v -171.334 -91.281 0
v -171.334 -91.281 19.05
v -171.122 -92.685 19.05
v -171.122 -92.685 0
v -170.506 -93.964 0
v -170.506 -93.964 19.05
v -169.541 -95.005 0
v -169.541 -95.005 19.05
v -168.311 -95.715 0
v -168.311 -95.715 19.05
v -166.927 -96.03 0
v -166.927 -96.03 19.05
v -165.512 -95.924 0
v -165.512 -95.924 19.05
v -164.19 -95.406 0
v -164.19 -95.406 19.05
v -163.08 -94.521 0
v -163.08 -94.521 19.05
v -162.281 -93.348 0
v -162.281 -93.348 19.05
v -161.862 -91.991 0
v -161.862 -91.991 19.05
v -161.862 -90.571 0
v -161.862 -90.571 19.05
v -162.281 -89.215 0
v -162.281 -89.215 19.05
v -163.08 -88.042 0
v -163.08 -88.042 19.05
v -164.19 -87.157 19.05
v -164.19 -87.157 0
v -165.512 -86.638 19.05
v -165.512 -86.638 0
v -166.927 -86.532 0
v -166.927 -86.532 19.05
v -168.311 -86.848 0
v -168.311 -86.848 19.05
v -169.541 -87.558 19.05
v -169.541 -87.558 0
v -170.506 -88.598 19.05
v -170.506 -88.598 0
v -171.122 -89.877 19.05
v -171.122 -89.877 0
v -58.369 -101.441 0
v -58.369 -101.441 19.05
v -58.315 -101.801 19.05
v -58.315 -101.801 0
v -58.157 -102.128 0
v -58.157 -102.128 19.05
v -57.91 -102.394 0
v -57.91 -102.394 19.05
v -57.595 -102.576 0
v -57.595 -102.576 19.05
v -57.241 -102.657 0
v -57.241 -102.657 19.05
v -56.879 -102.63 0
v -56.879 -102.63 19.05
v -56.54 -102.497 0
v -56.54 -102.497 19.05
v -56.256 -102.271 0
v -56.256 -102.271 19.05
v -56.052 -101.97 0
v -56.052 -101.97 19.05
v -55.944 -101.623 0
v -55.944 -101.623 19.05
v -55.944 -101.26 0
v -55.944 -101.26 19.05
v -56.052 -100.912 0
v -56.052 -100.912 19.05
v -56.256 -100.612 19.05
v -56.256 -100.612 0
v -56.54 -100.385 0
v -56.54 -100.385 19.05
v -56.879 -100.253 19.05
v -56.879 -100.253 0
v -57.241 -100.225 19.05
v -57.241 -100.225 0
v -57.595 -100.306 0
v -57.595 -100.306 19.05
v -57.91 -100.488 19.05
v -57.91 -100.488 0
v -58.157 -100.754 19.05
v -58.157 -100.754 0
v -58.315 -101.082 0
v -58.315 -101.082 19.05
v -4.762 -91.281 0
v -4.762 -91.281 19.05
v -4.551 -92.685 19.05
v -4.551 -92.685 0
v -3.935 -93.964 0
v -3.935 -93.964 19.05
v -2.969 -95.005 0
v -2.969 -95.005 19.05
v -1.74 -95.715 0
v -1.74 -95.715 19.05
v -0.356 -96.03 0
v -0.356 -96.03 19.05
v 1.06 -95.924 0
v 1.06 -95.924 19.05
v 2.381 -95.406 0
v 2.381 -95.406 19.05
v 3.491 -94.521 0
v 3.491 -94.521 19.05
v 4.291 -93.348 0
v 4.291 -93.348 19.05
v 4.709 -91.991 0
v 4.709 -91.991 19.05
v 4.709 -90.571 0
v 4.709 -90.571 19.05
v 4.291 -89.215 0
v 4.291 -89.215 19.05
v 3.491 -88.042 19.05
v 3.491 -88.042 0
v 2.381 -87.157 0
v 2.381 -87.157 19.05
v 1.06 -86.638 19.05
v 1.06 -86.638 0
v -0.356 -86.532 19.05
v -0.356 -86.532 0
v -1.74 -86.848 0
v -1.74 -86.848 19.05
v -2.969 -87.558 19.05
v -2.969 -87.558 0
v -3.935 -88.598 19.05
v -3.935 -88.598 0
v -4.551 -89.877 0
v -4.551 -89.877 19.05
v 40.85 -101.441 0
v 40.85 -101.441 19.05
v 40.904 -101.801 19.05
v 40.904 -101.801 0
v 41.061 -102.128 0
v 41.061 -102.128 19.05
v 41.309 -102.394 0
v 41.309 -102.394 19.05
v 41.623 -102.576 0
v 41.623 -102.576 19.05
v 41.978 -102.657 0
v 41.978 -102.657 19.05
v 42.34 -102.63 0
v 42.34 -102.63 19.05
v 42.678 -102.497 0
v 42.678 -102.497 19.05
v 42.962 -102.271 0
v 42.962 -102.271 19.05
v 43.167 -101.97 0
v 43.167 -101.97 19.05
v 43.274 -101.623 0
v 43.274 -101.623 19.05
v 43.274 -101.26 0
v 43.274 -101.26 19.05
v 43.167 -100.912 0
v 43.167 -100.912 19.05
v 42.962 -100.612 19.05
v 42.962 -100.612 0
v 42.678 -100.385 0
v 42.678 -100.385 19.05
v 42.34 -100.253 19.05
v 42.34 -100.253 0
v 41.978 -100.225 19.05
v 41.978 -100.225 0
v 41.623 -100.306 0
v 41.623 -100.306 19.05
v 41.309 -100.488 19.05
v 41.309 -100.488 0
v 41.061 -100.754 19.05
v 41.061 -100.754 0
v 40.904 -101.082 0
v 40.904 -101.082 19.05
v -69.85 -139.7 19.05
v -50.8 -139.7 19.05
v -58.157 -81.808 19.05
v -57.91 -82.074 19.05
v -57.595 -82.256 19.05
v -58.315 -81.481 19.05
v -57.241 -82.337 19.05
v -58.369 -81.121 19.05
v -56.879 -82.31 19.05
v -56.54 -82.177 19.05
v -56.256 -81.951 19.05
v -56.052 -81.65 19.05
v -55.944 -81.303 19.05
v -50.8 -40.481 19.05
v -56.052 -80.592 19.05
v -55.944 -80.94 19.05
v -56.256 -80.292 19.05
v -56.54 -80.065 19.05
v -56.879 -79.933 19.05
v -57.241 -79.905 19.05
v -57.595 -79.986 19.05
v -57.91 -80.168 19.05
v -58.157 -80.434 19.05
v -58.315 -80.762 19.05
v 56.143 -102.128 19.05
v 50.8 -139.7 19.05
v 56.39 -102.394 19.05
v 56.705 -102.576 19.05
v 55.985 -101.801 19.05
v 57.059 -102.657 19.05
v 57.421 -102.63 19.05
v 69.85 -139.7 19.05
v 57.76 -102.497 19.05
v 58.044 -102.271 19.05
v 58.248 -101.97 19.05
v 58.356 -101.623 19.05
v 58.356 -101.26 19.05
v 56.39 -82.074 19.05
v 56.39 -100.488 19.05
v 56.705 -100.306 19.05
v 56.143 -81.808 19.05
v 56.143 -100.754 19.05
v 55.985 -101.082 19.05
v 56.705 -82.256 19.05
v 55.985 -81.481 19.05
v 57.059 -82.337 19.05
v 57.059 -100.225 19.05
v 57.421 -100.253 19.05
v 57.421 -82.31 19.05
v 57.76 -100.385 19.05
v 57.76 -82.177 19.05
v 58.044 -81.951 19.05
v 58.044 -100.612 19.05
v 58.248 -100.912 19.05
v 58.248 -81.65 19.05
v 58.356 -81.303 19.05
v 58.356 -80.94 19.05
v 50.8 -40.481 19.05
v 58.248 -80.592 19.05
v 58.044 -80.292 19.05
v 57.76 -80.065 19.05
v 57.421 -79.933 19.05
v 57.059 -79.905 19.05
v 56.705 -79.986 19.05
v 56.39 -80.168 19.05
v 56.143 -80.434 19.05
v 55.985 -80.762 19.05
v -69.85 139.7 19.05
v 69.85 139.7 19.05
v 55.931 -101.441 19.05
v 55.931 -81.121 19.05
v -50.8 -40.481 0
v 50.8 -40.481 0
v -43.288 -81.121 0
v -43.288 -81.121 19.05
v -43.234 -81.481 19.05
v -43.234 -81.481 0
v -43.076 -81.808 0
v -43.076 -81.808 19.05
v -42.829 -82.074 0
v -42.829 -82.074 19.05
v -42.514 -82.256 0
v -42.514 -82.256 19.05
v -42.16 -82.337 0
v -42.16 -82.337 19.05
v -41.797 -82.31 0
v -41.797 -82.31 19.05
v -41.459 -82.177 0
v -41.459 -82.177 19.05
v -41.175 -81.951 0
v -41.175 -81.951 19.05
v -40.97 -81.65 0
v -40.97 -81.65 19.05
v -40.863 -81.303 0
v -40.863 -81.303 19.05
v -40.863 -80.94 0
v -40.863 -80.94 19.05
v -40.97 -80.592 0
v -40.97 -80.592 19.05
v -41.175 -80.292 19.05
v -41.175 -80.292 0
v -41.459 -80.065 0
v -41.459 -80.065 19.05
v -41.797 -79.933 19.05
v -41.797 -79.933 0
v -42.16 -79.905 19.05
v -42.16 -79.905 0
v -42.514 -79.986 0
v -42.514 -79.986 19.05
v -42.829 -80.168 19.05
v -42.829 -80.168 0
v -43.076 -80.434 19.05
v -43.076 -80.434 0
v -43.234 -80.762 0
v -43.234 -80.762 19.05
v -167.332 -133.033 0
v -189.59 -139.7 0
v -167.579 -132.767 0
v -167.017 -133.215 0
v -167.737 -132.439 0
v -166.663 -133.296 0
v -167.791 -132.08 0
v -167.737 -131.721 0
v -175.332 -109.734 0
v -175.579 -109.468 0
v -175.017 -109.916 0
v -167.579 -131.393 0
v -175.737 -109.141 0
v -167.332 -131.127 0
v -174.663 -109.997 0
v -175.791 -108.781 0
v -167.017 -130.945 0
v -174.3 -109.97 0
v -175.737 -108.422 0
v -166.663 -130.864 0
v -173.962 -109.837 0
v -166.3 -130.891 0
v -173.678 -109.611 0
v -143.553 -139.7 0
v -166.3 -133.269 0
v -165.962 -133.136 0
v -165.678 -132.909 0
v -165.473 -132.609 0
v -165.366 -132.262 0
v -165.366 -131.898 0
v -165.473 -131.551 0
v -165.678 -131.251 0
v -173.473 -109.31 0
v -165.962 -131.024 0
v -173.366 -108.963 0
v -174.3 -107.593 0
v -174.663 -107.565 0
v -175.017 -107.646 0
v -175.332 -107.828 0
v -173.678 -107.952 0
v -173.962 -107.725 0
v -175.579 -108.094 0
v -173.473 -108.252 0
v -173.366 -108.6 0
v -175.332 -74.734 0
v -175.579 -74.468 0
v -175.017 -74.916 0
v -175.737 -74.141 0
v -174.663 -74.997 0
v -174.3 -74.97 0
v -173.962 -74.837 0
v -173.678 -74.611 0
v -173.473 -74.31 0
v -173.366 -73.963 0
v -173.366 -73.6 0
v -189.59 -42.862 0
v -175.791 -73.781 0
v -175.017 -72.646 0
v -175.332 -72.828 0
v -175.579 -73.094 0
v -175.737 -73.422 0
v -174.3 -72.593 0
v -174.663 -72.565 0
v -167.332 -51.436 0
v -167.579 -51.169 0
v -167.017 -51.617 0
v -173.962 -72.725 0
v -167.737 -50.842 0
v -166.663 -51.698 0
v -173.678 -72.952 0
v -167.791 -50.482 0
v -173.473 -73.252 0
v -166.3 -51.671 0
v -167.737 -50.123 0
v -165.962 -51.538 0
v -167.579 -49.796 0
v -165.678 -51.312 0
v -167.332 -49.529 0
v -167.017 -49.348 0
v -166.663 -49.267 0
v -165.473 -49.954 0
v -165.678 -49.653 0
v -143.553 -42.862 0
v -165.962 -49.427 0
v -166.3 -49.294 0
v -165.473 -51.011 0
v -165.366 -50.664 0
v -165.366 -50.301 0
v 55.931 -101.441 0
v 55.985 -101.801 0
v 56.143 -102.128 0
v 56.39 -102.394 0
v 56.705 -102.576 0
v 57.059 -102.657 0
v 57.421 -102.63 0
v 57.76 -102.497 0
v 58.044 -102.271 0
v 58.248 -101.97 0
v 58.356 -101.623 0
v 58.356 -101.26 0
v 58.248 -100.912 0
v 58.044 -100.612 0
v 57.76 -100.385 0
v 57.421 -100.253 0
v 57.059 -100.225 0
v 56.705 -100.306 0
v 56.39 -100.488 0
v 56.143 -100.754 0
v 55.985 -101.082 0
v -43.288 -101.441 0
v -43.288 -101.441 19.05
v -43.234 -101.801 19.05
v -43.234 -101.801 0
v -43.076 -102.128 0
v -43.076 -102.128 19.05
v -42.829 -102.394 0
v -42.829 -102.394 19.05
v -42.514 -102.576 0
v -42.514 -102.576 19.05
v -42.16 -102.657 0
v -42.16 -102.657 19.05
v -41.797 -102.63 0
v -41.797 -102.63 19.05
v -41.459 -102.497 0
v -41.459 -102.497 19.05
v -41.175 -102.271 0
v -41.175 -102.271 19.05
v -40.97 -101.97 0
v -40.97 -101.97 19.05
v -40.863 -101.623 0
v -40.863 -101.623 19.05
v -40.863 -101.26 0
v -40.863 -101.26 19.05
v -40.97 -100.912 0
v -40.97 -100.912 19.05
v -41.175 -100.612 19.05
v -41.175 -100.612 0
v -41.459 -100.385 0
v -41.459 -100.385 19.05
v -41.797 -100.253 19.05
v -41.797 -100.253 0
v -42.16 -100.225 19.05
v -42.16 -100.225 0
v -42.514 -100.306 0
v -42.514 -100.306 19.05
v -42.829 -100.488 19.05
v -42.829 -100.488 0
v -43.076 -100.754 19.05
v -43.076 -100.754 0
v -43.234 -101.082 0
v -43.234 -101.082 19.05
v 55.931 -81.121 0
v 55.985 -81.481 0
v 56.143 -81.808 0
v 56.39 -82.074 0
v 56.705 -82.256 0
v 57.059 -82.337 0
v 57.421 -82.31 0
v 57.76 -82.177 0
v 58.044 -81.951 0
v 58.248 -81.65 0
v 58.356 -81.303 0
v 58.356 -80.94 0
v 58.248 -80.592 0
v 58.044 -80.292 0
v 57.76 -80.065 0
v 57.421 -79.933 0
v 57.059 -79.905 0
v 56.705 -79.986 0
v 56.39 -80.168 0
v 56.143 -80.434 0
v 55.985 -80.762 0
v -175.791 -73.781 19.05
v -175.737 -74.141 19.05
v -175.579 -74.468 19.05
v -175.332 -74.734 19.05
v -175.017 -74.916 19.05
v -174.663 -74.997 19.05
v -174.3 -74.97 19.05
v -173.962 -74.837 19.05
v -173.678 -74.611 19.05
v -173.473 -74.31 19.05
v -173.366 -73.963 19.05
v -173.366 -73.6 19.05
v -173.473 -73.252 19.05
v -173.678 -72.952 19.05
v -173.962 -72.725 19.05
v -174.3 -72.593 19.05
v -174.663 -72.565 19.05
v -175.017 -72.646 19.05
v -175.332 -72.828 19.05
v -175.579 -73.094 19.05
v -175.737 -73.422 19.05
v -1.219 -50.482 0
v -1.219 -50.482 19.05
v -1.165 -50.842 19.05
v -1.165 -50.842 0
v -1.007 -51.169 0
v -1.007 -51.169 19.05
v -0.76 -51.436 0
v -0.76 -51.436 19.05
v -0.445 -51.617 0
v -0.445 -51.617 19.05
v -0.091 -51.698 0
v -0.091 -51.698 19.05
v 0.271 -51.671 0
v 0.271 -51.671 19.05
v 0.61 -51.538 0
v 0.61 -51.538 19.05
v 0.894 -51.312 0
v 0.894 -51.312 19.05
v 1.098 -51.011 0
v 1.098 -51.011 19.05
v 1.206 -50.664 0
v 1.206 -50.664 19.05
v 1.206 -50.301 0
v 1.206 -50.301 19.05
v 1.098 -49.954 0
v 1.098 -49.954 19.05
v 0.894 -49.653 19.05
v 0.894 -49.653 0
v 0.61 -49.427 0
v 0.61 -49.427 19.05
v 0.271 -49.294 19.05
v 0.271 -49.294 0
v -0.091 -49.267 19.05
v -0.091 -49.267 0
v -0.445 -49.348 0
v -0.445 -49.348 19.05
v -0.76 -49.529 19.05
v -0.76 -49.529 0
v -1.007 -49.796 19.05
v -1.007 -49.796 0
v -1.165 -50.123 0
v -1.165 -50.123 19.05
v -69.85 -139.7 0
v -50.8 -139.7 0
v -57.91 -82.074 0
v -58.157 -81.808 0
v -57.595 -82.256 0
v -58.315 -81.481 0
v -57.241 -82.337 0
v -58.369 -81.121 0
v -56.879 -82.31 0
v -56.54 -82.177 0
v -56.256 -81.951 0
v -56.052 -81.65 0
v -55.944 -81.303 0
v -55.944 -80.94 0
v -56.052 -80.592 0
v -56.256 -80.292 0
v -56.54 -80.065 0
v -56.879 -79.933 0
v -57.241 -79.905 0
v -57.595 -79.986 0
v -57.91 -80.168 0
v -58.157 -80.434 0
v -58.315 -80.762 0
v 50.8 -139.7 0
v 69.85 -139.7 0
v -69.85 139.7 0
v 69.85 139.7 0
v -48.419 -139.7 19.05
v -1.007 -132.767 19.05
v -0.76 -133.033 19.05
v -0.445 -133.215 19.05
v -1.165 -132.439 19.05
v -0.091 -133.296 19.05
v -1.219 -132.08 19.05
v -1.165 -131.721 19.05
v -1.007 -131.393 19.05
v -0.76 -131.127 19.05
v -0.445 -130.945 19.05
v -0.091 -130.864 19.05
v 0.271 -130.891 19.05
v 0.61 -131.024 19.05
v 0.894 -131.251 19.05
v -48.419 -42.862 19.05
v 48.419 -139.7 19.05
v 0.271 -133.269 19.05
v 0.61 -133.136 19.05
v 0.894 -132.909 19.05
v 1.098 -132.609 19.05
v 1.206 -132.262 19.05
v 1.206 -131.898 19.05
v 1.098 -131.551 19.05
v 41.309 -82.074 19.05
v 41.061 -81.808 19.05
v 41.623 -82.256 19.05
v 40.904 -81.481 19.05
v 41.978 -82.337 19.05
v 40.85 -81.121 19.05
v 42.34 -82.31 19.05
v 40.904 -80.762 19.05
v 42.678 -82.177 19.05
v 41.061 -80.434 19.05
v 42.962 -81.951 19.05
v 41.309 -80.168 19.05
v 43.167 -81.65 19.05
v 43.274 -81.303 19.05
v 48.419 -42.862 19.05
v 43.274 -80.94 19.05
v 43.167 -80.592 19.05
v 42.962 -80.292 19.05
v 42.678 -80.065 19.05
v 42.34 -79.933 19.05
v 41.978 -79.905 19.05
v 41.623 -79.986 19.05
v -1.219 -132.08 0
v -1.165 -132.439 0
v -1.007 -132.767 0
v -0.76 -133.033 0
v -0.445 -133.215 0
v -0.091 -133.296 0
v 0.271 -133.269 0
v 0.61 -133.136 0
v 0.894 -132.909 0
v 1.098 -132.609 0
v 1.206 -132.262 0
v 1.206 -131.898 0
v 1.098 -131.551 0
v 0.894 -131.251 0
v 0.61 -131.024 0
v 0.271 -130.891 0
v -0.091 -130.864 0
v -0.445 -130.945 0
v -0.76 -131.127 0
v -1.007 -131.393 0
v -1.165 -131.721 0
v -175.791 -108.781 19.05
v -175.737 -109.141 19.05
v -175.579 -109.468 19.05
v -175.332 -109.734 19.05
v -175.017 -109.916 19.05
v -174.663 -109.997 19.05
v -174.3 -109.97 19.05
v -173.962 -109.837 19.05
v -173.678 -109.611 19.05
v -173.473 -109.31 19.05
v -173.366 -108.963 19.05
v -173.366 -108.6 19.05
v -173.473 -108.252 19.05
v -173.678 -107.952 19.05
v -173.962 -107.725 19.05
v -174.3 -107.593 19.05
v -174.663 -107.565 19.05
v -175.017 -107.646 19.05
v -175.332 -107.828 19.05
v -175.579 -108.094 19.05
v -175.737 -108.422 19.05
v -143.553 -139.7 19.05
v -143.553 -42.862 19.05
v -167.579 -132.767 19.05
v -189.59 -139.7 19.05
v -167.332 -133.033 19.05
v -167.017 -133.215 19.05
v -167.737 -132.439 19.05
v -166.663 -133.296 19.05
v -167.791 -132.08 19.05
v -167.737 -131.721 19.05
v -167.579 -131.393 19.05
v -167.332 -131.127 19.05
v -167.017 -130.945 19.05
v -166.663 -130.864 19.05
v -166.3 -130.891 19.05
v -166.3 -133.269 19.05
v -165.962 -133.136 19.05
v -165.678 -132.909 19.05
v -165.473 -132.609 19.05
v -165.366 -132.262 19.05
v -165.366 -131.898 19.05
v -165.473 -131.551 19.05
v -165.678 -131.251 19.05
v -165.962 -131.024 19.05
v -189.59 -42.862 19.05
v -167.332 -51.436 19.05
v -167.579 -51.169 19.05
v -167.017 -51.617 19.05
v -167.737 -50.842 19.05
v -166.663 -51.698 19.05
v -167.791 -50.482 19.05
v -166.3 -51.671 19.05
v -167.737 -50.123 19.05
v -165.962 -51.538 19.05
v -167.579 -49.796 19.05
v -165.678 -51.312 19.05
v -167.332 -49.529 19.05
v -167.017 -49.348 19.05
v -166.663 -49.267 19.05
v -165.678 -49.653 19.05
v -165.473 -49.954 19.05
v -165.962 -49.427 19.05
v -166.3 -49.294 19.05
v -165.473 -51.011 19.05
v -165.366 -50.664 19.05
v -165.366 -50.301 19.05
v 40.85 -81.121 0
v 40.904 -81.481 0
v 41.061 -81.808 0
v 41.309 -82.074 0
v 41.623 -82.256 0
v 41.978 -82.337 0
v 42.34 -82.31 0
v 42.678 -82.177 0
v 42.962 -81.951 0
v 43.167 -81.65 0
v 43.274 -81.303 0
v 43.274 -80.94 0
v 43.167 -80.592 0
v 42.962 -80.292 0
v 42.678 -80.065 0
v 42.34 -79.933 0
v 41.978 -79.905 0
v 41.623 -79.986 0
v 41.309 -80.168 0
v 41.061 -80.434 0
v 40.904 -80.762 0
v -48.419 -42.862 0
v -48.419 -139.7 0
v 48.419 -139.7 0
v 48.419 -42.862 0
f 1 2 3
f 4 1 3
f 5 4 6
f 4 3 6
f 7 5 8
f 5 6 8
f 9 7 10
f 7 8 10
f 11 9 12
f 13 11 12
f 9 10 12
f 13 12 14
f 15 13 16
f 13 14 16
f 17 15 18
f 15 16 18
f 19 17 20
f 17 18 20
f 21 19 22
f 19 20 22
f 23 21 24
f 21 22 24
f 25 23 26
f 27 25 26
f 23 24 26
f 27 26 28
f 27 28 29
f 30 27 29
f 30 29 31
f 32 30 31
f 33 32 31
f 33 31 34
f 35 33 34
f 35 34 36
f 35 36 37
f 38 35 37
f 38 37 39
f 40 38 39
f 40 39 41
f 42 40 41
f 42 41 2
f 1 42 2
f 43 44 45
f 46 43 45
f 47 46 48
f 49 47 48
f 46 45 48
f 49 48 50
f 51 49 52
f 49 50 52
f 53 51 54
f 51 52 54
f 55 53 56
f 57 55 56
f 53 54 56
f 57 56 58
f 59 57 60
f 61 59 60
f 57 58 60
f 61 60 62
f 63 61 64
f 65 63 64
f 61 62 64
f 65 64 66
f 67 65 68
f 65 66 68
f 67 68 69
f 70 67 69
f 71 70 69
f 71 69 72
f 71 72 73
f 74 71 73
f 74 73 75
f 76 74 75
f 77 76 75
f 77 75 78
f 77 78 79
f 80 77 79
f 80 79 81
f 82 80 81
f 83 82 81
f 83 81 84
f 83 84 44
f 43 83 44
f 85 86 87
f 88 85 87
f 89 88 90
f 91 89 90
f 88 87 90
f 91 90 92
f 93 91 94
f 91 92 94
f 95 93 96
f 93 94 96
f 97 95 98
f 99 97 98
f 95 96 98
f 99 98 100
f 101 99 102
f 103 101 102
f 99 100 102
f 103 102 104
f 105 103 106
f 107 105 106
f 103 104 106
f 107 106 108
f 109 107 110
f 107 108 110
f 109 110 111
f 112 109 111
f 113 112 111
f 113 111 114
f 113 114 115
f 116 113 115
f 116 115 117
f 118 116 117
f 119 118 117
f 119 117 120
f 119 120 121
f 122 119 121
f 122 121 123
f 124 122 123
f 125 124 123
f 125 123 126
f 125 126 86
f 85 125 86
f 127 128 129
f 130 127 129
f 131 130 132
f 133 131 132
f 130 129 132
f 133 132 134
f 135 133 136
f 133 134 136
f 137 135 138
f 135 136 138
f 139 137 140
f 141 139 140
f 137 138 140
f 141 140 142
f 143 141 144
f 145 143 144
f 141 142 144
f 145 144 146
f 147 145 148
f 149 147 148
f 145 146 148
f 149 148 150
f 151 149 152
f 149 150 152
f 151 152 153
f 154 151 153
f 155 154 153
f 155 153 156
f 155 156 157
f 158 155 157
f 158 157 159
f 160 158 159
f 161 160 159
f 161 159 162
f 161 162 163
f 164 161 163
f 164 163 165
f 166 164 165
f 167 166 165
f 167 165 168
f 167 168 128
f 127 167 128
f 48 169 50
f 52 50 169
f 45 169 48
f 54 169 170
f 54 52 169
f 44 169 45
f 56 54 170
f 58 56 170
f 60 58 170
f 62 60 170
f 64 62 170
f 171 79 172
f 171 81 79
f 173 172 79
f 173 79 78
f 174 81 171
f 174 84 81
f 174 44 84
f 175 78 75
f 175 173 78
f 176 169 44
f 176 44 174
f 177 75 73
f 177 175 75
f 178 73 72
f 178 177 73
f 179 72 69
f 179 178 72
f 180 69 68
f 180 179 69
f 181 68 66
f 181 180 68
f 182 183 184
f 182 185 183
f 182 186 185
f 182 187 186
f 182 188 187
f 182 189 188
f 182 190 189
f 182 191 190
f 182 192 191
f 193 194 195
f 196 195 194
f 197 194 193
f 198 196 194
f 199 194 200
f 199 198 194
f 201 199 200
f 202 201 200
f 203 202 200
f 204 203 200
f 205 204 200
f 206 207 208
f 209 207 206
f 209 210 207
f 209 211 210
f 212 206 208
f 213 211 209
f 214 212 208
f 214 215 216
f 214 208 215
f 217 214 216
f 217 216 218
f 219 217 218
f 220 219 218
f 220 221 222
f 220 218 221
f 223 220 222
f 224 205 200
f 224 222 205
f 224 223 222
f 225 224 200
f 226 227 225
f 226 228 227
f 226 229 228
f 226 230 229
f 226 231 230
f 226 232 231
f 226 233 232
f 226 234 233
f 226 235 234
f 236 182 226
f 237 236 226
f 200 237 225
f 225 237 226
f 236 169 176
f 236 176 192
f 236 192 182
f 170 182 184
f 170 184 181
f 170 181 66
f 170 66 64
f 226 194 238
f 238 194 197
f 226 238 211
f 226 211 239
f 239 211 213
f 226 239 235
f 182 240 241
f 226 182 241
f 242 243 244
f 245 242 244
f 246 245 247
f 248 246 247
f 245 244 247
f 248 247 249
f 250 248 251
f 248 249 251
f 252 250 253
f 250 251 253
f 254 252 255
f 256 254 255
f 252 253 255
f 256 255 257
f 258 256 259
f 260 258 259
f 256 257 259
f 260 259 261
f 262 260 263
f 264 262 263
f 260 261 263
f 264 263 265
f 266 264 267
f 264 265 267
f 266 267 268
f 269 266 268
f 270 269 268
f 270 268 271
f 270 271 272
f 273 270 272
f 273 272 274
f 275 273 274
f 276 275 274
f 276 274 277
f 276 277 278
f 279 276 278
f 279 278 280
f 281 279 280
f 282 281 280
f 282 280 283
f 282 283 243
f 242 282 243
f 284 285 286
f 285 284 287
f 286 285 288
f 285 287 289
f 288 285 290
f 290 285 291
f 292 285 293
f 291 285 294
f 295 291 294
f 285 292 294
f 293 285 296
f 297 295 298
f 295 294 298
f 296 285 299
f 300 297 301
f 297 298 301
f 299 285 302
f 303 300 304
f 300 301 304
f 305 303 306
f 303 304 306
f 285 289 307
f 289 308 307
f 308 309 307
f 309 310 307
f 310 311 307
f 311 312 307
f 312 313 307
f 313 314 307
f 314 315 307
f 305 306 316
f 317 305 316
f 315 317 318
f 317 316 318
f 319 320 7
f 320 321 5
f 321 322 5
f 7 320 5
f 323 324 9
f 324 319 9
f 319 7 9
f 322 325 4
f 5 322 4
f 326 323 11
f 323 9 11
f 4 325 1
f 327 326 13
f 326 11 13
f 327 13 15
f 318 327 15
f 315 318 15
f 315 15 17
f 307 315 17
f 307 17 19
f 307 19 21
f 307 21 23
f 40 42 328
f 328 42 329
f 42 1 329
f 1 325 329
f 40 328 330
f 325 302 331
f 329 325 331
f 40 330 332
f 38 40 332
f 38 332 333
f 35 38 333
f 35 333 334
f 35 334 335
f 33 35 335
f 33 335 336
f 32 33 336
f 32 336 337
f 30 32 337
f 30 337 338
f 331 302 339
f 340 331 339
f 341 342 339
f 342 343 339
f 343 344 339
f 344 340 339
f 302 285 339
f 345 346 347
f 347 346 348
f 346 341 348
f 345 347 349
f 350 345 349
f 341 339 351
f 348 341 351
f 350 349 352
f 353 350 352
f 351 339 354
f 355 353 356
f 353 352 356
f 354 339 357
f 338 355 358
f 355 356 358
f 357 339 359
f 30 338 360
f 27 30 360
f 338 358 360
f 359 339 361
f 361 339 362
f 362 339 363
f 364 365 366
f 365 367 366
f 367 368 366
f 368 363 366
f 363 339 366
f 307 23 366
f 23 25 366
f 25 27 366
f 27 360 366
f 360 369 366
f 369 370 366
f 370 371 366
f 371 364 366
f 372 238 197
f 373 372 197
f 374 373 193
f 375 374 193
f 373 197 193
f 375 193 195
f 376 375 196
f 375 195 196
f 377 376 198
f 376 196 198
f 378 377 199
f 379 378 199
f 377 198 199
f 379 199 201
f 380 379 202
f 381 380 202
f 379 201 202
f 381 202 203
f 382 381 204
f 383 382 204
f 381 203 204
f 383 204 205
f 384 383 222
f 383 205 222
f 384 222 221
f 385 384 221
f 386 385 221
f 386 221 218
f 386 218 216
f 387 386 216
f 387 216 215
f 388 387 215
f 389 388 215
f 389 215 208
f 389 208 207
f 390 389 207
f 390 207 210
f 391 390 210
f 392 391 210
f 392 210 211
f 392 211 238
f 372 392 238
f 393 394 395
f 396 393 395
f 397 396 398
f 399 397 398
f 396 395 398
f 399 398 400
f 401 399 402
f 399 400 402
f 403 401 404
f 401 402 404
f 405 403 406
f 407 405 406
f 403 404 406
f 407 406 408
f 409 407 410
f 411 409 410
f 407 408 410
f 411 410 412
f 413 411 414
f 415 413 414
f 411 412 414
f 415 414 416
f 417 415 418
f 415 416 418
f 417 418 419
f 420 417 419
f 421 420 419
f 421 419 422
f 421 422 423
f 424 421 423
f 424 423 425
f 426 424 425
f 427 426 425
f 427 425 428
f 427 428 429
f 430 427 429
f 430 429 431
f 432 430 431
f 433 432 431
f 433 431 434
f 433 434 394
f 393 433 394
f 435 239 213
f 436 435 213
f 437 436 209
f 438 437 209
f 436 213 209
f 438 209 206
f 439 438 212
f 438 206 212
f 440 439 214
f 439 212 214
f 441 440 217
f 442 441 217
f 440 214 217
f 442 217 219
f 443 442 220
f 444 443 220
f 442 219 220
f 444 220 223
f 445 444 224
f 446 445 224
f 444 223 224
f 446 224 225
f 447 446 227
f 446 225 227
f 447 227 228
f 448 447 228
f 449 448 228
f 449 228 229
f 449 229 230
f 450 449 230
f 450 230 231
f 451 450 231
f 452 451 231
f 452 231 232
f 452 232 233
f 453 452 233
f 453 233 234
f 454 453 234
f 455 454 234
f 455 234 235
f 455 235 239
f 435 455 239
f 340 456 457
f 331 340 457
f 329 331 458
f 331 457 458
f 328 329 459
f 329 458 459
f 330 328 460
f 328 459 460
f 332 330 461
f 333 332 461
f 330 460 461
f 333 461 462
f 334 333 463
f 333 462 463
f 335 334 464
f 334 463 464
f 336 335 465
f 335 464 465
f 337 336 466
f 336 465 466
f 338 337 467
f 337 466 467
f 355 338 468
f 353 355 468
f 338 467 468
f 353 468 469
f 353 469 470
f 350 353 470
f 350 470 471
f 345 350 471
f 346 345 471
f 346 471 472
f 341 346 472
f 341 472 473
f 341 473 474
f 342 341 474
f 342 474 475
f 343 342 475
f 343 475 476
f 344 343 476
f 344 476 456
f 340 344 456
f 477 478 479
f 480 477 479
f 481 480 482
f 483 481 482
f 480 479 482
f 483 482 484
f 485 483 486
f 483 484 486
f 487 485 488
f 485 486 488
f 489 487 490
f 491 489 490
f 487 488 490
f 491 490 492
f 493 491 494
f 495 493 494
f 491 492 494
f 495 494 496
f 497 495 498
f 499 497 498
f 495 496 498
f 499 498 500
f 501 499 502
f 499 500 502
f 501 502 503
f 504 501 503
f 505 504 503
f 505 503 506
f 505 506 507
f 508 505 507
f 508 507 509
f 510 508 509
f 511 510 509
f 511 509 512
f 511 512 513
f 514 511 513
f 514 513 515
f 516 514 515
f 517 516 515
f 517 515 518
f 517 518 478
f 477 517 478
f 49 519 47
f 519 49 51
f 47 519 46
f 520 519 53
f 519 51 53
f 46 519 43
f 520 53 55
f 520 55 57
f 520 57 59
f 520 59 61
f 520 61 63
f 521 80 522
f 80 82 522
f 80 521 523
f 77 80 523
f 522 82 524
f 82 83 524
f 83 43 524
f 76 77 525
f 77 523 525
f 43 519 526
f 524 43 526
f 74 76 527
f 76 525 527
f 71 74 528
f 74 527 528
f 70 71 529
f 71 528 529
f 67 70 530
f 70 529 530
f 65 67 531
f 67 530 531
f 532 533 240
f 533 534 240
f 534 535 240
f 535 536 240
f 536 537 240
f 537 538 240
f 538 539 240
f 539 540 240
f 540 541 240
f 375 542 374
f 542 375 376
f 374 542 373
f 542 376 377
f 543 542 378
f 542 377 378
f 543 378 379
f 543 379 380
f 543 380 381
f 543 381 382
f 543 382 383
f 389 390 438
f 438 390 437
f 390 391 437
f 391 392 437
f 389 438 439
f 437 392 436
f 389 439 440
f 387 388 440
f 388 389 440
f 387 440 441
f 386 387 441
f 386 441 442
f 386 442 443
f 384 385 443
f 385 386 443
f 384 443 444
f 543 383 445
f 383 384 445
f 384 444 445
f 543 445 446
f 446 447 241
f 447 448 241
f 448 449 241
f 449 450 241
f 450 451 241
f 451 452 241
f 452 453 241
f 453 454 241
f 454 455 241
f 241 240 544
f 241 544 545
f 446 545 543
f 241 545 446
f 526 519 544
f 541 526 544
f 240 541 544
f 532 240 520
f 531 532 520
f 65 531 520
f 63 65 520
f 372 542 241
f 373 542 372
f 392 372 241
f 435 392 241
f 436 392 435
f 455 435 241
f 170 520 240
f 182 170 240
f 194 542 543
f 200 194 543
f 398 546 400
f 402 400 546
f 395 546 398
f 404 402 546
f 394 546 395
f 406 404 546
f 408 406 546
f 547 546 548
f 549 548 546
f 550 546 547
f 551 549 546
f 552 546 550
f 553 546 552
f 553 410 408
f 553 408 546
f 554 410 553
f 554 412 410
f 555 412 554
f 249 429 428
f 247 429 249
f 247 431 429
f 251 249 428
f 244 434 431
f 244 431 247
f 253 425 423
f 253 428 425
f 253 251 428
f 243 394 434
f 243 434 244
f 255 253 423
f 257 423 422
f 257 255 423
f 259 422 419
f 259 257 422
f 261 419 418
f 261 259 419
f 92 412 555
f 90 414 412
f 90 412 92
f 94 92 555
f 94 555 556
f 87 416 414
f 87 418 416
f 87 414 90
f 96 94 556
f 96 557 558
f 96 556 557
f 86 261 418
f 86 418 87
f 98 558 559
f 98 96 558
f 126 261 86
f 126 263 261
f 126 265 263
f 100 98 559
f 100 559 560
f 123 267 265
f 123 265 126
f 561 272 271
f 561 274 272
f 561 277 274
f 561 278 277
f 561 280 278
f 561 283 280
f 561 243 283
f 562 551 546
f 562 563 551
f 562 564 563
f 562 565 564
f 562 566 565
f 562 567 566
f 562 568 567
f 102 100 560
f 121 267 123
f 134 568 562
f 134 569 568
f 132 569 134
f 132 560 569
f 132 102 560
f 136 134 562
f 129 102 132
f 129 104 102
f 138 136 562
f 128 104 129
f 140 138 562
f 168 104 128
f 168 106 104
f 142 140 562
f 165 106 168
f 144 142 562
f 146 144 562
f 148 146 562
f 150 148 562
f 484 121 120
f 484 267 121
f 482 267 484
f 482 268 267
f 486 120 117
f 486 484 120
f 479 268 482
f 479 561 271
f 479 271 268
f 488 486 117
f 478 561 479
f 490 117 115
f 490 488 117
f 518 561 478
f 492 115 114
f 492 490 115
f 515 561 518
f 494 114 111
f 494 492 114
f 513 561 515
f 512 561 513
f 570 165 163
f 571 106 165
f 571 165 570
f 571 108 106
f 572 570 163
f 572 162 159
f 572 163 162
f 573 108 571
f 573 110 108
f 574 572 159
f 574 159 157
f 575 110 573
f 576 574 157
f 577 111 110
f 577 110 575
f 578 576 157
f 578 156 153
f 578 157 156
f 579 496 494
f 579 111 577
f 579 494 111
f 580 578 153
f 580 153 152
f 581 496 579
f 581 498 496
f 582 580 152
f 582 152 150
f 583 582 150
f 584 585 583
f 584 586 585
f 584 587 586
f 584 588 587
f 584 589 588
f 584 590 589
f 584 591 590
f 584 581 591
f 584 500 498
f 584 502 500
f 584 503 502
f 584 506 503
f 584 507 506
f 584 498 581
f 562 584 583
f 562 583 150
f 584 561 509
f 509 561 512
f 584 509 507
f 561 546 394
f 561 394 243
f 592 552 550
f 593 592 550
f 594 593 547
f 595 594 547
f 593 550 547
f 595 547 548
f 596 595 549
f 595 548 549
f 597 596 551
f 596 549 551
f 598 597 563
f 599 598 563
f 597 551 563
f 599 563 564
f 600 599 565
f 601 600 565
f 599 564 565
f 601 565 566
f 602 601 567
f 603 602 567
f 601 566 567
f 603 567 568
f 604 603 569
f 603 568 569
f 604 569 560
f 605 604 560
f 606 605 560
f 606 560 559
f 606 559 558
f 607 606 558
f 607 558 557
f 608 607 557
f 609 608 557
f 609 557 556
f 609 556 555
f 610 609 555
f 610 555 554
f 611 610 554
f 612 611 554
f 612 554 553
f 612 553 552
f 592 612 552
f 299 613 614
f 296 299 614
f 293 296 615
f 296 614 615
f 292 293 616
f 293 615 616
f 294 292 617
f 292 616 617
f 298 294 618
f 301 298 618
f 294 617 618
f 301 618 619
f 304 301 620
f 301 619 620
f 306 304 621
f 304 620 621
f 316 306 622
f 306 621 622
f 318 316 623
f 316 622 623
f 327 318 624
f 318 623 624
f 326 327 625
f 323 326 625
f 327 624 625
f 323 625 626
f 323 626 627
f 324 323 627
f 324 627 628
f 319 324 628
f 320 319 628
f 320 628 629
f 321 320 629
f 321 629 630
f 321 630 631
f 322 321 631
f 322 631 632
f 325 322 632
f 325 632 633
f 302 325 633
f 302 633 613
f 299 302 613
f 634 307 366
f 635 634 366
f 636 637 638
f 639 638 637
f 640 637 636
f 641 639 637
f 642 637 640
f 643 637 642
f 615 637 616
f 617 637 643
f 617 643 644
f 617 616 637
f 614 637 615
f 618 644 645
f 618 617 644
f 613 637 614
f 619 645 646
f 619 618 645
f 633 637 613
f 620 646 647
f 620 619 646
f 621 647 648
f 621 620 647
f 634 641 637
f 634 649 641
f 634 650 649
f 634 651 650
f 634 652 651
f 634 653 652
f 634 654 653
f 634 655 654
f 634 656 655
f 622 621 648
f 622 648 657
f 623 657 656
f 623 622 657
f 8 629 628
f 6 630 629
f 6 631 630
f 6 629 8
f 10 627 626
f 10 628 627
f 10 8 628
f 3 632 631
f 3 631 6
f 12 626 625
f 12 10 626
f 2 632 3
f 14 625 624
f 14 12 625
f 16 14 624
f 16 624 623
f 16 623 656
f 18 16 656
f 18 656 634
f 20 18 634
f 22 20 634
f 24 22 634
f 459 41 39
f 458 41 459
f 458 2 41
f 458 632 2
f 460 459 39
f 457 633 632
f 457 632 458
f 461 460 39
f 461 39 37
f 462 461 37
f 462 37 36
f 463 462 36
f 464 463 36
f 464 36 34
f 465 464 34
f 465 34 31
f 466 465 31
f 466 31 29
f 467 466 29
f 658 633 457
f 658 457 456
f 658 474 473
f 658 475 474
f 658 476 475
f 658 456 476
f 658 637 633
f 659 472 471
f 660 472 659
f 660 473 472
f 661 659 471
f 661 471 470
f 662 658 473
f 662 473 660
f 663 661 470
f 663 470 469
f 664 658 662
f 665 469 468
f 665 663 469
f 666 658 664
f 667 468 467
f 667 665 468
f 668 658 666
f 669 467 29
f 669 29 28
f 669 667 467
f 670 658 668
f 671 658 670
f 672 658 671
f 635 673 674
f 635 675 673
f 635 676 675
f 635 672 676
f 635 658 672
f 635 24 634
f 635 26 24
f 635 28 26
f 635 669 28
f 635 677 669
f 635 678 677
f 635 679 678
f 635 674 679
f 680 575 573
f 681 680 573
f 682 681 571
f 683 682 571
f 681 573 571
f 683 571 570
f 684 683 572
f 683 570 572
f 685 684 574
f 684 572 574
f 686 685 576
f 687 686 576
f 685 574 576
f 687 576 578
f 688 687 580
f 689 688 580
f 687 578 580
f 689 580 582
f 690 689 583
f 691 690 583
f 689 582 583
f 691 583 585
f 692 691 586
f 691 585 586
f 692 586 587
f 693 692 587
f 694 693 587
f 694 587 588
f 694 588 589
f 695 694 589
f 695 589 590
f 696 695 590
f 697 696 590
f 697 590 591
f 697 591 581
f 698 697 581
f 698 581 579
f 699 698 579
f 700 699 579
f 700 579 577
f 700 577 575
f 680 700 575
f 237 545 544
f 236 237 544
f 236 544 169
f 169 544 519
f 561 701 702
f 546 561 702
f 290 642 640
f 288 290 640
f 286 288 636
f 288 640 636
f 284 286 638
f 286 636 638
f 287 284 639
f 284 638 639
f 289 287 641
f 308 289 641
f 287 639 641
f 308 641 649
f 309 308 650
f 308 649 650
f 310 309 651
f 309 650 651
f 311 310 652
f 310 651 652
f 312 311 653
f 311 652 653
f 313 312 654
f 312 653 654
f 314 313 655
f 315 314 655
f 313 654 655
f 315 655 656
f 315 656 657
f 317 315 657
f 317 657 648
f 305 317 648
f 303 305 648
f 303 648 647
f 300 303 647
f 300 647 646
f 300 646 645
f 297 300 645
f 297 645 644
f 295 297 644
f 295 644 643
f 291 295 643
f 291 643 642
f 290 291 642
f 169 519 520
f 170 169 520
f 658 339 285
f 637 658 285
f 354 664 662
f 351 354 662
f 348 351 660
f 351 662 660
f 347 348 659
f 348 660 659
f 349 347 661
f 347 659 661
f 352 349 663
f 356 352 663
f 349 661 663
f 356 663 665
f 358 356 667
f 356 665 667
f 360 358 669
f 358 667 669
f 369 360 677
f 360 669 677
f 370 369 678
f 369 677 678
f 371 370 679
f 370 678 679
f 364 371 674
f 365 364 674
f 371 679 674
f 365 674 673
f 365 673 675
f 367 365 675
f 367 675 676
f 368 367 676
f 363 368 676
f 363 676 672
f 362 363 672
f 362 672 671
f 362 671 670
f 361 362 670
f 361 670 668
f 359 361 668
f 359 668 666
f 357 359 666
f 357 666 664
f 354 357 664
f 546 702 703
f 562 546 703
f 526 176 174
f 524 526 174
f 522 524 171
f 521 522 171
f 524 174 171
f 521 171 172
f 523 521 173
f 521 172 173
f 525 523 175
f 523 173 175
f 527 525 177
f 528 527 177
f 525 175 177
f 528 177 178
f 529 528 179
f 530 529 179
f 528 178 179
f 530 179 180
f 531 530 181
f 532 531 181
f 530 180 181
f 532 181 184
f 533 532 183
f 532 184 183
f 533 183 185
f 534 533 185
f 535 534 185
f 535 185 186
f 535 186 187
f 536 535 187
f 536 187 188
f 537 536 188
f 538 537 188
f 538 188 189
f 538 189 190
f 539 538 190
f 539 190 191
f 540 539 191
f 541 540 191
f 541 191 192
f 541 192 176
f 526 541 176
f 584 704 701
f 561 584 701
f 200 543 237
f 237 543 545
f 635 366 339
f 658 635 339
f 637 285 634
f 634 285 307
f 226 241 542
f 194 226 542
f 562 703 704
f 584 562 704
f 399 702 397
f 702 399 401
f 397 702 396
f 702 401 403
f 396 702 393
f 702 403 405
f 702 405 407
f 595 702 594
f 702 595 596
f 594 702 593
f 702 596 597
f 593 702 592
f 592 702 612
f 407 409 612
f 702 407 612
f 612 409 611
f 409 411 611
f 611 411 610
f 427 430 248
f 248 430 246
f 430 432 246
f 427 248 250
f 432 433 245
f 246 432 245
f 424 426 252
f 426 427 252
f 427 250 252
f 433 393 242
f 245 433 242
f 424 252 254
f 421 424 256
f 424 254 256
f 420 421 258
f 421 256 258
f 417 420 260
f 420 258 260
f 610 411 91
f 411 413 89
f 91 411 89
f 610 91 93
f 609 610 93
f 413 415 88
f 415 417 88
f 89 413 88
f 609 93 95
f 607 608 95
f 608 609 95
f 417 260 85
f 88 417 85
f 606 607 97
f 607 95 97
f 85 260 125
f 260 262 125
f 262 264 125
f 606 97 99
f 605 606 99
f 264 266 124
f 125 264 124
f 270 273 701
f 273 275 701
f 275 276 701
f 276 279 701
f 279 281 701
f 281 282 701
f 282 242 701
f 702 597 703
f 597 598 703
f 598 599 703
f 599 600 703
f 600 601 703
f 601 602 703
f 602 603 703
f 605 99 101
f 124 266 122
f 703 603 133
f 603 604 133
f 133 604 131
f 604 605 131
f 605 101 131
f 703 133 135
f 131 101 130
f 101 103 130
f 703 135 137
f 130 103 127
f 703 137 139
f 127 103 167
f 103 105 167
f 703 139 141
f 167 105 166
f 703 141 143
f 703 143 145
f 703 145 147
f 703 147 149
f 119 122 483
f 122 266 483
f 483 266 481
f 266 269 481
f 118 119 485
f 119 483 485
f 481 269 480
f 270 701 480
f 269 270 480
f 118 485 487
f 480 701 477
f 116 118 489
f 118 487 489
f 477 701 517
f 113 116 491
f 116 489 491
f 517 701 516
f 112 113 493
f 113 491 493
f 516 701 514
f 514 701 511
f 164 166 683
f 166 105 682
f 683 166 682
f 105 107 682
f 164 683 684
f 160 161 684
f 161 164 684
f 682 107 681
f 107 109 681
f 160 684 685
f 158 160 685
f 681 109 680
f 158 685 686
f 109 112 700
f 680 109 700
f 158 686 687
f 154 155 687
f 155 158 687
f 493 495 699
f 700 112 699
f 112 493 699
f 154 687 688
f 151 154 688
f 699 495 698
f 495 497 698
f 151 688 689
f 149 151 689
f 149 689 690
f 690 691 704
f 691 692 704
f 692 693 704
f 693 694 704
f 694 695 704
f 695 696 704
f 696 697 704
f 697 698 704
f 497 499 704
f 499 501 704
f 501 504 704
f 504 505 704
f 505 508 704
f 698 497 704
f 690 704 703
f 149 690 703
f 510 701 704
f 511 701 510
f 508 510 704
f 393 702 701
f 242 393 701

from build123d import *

# Parameters (mm, degrees)
F1_DEPTH = 19.05
F2_D     = 2.4384
F2_2_D   = 2.4384
F3_DEPTH = 19.05
F4_D     = 9.525
F4_2_D   = 9.525
F5_D     = 2.4384


# Not quite as in the source:
# - a feature names something its author has since deleted; it is built from what else it names


with BuildPart() as f1:
    # F0 (on Top) → F1 (new body)
    with BuildSketch(Plane.XY):
        Polygon((50.8, -139.7), (69.85, -139.7), (69.85, 139.7), (-69.85, 139.7), (-69.85, -139.7), (-50.8, -139.7), (-50.8, -40.48125), (50.8, -40.48125), align=None)
    extrude(amount=F1_DEPTH)

    # F2 (through all)
    with Locations(Plane(origin=(0, 0, 0), x_dir=(1, 0, 0), z_dir=(0, 0, -1))):
        with Locations((-57.15, 81.12125), (-57.15, 101.44125), (-42.06875, 101.44125), (-42.06875, 81.12125), (42.06875, 81.12125), (57.15, 81.12125), (57.15, 101.44125), (42.06875, 101.44125), (0, 50.4825), (0, 132.08)):
            Hole(F2_D / 2)


with BuildPart() as f1b:
    # F0 (on Top) → F1, piece 2 (new body)
    with BuildSketch(Plane.XY):
        Polygon((48.41875, -42.8625), (-48.41875, -139.7), (48.41875, -139.7), align=None)
        Polygon((-48.41875, -42.8625), (-48.41875, -139.7), (48.41875, -42.8625), align=None)
    extrude(amount=F1_DEPTH)

    # F2#2 (through all)
    with Locations(Plane(origin=(0, 0, 0), x_dir=(1, 0, 0), z_dir=(0, 0, -1))):
        with Locations((-57.15, 81.12125), (-57.15, 101.44125), (-42.06875, 101.44125), (-42.06875, 81.12125), (42.06875, 81.12125), (57.15, 81.12125), (57.15, 101.44125), (42.06875, 101.44125), (0, 50.4825), (0, 132.08)):
            Hole(F2_2_D / 2)

    # F4 (through all)
    with Locations(Plane(origin=(0, 0, 0), x_dir=(1, 0, 0), z_dir=(0, 0, -1))):
        with Locations((-166.5715282751, 91.28125), (0, 91.28125)):
            Hole(F4_D / 2)


with BuildPart() as f3:
    # F0 (on Top) → F3 (new body)
    with BuildSketch(Plane.XY):
        with BuildLine():
            ThreePointArc((-173.1950164444, -105.2134147701), (-187.2154043393, -85.270226953), (-162.8976236217, -83.5533815912))
            Line((-162.8976236217, -83.5533815912), (-143.5527782751, -42.8625))
            Line((-143.5527782751, -42.8625), (-189.5902782751, -42.8625))
            Line((-189.5902782751, -42.8625), (-189.5902782751, -61.9125))
            Line((-189.5902782751, -61.9125), (-189.5902782751, -120.65))
            Line((-189.5902782751, -120.65), (-189.5902782751, -139.7))
            Line((-189.5902782751, -139.7), (-173.1950164444, -105.2134147701))
        make_face()
        with BuildLine():
            ThreePointArc((-162.8976236217, -83.5533815912), (-161.1656589421, -87.2460712646), (-160.5715282751, -91.28125))
            ThreePointArc((-160.5715282751, -91.28125), (-164.1967712748, -100.6814849537), (-173.1950164444, -105.2134147701))
            Line((-173.1950164444, -105.2134147701), (-189.5902782751, -139.7))
            Line((-189.5902782751, -139.7), (-143.5527782751, -139.7))
            Line((-143.5527782751, -139.7), (-143.5527782751, -83.2121861219))
            Line((-143.5527782751, -83.2121861219), (-143.5527782751, -61.9125))
            Line((-143.5527782751, -61.9125), (-143.5527782751, -42.8625))
            Line((-143.5527782751, -42.8625), (-162.8976236217, -83.5533815912))
        make_face()
        with BuildLine():
            Line((-173.1950164444, -105.2134147701), (-162.8976236217, -83.5533815912))
            ThreePointArc((-162.8976236217, -83.5533815912), (-187.2154043393, -85.270226953), (-173.1950164444, -105.2134147701))
        make_face()
        with BuildLine():
            ThreePointArc((-173.1950164444, -105.2134147701), (-164.1967712748, -100.6814849537), (-160.5715282751, -91.28125))
            ThreePointArc((-160.5715282751, -91.28125), (-161.1656589421, -87.2460712646), (-162.8976236217, -83.5533815912))
            Line((-162.8976236217, -83.5533815912), (-173.1950164444, -105.2134147701))
        make_face()
    extrude(amount=F3_DEPTH)

    # F4#2 (through all)
    with Locations(Plane(origin=(0, 0, 0), x_dir=(1, 0, 0), z_dir=(0, 0, -1))):
        with Locations((-166.5715282751, 91.28125), (0, 91.28125)):
            Hole(F4_2_D / 2)

    # F5 (through all)
    with Locations(Plane(origin=(0, 0, 0), x_dir=(1, 0, 0), z_dir=(0, 0, -1))):
        with Locations((-166.5715282751, 50.4825), (-174.5715282751, 73.78125), (-174.5715282751, 108.78125), (-166.5715282751, 132.08)):
            Hole(F5_D / 2)


solid = Compound([f1.part, f1b.part, f3.part])
